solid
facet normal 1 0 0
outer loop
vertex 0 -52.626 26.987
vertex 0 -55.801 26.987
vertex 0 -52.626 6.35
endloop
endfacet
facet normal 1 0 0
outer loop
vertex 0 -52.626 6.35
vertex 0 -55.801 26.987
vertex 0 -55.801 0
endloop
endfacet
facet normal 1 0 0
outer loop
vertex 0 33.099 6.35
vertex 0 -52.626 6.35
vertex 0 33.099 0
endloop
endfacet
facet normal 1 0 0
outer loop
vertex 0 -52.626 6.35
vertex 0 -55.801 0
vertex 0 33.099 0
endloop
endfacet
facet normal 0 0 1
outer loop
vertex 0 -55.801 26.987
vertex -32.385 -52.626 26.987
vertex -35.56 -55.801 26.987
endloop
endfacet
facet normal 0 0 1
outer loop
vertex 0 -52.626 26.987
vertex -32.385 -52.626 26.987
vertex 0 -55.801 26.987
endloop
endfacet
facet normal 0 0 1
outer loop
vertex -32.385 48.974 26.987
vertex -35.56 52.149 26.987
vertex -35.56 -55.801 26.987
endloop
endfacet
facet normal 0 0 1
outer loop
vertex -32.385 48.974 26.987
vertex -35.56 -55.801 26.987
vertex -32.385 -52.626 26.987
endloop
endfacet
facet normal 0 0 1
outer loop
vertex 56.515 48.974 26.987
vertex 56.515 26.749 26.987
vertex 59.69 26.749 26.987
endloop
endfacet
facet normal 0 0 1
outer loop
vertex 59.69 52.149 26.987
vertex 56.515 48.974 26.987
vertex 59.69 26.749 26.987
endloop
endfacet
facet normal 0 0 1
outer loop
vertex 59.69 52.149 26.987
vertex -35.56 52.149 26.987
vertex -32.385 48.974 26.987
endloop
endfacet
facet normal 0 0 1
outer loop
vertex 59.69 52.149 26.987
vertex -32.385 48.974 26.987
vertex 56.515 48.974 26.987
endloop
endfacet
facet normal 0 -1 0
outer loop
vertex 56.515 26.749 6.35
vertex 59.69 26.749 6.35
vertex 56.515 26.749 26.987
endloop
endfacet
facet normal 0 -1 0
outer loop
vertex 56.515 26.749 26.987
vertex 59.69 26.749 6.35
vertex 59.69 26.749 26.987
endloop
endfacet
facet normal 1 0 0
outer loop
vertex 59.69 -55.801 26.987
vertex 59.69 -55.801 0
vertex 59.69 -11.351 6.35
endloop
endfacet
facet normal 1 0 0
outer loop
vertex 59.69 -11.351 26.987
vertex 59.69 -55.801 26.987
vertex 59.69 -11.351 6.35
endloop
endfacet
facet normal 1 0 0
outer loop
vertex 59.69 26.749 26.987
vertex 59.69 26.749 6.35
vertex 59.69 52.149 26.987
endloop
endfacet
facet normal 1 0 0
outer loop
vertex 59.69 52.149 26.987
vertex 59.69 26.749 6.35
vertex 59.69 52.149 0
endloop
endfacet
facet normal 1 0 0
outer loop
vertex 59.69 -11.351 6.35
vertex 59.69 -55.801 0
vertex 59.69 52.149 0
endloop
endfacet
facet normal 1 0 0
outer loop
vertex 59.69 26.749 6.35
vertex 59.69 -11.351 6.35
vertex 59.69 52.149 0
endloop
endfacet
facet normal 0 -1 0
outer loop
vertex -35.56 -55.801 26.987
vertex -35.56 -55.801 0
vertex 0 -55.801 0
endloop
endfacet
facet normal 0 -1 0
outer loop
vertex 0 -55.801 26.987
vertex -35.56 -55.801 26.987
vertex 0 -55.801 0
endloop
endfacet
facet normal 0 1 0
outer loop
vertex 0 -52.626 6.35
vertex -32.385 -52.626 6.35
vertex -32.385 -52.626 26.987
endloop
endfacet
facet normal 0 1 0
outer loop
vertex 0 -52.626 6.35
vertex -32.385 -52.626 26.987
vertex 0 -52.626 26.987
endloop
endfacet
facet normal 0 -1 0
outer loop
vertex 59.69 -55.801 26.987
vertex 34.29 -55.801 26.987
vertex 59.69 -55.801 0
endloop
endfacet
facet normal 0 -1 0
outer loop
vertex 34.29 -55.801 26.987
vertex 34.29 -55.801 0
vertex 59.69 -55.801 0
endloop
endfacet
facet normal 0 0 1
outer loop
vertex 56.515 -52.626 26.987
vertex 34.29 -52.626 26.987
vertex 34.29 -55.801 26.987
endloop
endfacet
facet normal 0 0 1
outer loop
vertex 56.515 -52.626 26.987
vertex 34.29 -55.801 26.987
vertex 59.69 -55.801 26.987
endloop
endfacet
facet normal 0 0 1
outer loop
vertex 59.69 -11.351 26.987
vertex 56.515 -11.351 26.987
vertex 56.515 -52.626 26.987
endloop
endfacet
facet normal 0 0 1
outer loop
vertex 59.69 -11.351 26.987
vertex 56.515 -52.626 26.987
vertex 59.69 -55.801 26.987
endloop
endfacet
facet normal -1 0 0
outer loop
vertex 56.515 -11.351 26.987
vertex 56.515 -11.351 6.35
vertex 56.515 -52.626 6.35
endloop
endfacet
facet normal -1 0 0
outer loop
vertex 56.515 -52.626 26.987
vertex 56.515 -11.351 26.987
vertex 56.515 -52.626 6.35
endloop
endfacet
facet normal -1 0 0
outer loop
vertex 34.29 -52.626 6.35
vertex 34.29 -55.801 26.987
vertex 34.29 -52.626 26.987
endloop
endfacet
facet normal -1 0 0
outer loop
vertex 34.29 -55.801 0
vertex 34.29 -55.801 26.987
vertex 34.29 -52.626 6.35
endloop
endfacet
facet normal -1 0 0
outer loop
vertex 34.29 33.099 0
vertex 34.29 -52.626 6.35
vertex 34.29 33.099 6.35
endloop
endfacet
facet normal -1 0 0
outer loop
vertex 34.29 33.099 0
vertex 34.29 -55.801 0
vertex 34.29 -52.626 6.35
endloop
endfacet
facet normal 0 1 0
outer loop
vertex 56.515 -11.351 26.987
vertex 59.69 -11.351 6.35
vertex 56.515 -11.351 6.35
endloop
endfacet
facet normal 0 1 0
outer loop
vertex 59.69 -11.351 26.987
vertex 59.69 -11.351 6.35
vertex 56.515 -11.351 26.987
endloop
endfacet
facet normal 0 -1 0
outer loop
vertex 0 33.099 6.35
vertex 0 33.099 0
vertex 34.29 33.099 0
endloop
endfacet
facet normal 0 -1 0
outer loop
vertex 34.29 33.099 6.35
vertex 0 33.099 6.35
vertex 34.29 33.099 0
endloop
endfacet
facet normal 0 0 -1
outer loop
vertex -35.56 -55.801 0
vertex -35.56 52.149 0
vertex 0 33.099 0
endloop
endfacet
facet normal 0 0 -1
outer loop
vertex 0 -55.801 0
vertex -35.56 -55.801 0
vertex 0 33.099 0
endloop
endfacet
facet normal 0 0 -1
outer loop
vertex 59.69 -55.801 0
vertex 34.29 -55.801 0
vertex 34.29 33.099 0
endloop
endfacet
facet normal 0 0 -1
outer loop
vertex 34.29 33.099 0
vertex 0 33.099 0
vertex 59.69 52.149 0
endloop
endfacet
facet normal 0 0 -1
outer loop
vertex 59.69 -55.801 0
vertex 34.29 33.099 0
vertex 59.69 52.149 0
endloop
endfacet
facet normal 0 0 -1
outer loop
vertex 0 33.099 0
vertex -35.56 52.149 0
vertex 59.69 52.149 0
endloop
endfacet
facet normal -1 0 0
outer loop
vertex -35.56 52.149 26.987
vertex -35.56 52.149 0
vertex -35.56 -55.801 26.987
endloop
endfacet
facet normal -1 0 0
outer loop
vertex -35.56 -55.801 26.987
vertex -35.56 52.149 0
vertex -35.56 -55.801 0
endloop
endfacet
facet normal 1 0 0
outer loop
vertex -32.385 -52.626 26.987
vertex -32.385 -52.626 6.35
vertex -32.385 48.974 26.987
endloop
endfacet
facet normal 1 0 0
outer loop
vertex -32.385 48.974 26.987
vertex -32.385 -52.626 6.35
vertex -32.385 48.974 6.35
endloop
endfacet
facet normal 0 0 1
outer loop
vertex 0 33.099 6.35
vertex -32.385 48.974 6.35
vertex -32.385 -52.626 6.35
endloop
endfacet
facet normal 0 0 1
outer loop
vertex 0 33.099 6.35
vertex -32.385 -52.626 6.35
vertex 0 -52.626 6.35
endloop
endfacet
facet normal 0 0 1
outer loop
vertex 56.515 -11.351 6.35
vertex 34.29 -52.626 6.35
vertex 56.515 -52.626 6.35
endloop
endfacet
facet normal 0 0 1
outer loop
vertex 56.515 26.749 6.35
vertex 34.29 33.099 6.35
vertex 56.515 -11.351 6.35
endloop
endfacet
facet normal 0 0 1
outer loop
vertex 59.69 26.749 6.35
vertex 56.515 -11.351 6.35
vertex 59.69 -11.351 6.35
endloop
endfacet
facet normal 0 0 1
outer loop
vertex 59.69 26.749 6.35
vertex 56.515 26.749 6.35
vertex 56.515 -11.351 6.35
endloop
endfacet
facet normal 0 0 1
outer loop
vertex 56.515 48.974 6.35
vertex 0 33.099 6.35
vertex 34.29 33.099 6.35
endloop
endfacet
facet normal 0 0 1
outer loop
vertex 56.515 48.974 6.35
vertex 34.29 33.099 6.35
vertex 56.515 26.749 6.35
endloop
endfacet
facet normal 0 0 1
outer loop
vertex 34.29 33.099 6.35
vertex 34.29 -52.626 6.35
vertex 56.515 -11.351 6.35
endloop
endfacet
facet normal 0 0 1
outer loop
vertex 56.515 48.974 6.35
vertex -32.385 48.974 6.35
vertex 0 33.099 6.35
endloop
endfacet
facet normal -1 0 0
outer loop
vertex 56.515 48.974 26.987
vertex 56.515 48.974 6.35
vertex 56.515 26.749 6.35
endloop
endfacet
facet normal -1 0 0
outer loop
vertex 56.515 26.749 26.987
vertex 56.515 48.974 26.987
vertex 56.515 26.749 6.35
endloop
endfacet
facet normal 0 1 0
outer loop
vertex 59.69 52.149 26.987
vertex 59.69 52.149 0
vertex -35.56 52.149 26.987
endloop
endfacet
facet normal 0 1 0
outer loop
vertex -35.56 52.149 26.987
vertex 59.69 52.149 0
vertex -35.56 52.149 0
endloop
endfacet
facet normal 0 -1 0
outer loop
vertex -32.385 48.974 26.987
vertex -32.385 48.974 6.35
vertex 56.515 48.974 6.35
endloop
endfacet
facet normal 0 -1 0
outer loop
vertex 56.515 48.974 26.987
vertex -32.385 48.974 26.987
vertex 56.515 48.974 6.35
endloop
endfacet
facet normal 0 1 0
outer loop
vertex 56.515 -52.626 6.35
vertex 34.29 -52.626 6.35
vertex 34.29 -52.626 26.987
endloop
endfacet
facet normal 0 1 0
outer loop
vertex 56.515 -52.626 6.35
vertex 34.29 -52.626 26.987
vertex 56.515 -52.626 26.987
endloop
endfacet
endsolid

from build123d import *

# Parameters (mm, degrees)
F1_DEPTH = 6.35
F2_W     = 3.175
F2_H     = 3.175
F2_H_2   = 101.6
F2_W_2   = 88.9
F2_W_3   = 32.385
F2_W_4   = 22.225
F3_DEPTH = 20.6375
F4_W     = 38.1
F4_H     = 20.6375
F5_DEPTH = 3.175


with BuildPart() as f1:
    # F0 (on Top) → F1 (new body)
    with BuildSketch(Plane.XY):
        Polygon((59.69, 52.148615), (-35.56, 52.148615), (-35.56, -55.801385), (0, -55.801385), (0, 33.098615), (34.29, 33.098615), (34.29, -55.801385), (59.69, -55.801385), align=None)
    extrude(amount=F1_DEPTH)

    # F2 (on face) → F3 (join)
    with BuildSketch(Plane.XY.offset(6.35)):
        with Locations((-33.9725, -54.213885)):
            Rectangle(F2_W, F2_H)
        with Locations((-33.9725, -1.826385)):
            Rectangle(F2_W, F2_H_2)
        with Locations((-33.9725, 50.561115)):
            Rectangle(F2_W, F2_H)
        with Locations((12.065, 50.561115)):
            Rectangle(F2_W_2, F2_H)
        with Locations((58.1025, -1.826385)):
            Rectangle(F2_W, F2_H_2)
        with Locations((58.1025, 50.561115)):
            Rectangle(F2_W, F2_H)
        with Locations((58.1025, -54.213885)):
            Rectangle(F2_W, F2_H)
        with Locations((-16.1925, -54.213885)):
            Rectangle(F2_W_3, F2_H)
        with Locations((45.4025, -54.213885)):
            Rectangle(F2_W_4, F2_H)
    extrude(amount=F3_DEPTH)

    # F4 (on face) → F5 (cut)
    with BuildSketch(Plane.YZ.offset(59.69)):
        with Locations((7.698615, 16.66875)):
            Rectangle(F4_W, F4_H)
    extrude(amount=-F5_DEPTH, mode=Mode.SUBTRACT)


solid = f1.part
